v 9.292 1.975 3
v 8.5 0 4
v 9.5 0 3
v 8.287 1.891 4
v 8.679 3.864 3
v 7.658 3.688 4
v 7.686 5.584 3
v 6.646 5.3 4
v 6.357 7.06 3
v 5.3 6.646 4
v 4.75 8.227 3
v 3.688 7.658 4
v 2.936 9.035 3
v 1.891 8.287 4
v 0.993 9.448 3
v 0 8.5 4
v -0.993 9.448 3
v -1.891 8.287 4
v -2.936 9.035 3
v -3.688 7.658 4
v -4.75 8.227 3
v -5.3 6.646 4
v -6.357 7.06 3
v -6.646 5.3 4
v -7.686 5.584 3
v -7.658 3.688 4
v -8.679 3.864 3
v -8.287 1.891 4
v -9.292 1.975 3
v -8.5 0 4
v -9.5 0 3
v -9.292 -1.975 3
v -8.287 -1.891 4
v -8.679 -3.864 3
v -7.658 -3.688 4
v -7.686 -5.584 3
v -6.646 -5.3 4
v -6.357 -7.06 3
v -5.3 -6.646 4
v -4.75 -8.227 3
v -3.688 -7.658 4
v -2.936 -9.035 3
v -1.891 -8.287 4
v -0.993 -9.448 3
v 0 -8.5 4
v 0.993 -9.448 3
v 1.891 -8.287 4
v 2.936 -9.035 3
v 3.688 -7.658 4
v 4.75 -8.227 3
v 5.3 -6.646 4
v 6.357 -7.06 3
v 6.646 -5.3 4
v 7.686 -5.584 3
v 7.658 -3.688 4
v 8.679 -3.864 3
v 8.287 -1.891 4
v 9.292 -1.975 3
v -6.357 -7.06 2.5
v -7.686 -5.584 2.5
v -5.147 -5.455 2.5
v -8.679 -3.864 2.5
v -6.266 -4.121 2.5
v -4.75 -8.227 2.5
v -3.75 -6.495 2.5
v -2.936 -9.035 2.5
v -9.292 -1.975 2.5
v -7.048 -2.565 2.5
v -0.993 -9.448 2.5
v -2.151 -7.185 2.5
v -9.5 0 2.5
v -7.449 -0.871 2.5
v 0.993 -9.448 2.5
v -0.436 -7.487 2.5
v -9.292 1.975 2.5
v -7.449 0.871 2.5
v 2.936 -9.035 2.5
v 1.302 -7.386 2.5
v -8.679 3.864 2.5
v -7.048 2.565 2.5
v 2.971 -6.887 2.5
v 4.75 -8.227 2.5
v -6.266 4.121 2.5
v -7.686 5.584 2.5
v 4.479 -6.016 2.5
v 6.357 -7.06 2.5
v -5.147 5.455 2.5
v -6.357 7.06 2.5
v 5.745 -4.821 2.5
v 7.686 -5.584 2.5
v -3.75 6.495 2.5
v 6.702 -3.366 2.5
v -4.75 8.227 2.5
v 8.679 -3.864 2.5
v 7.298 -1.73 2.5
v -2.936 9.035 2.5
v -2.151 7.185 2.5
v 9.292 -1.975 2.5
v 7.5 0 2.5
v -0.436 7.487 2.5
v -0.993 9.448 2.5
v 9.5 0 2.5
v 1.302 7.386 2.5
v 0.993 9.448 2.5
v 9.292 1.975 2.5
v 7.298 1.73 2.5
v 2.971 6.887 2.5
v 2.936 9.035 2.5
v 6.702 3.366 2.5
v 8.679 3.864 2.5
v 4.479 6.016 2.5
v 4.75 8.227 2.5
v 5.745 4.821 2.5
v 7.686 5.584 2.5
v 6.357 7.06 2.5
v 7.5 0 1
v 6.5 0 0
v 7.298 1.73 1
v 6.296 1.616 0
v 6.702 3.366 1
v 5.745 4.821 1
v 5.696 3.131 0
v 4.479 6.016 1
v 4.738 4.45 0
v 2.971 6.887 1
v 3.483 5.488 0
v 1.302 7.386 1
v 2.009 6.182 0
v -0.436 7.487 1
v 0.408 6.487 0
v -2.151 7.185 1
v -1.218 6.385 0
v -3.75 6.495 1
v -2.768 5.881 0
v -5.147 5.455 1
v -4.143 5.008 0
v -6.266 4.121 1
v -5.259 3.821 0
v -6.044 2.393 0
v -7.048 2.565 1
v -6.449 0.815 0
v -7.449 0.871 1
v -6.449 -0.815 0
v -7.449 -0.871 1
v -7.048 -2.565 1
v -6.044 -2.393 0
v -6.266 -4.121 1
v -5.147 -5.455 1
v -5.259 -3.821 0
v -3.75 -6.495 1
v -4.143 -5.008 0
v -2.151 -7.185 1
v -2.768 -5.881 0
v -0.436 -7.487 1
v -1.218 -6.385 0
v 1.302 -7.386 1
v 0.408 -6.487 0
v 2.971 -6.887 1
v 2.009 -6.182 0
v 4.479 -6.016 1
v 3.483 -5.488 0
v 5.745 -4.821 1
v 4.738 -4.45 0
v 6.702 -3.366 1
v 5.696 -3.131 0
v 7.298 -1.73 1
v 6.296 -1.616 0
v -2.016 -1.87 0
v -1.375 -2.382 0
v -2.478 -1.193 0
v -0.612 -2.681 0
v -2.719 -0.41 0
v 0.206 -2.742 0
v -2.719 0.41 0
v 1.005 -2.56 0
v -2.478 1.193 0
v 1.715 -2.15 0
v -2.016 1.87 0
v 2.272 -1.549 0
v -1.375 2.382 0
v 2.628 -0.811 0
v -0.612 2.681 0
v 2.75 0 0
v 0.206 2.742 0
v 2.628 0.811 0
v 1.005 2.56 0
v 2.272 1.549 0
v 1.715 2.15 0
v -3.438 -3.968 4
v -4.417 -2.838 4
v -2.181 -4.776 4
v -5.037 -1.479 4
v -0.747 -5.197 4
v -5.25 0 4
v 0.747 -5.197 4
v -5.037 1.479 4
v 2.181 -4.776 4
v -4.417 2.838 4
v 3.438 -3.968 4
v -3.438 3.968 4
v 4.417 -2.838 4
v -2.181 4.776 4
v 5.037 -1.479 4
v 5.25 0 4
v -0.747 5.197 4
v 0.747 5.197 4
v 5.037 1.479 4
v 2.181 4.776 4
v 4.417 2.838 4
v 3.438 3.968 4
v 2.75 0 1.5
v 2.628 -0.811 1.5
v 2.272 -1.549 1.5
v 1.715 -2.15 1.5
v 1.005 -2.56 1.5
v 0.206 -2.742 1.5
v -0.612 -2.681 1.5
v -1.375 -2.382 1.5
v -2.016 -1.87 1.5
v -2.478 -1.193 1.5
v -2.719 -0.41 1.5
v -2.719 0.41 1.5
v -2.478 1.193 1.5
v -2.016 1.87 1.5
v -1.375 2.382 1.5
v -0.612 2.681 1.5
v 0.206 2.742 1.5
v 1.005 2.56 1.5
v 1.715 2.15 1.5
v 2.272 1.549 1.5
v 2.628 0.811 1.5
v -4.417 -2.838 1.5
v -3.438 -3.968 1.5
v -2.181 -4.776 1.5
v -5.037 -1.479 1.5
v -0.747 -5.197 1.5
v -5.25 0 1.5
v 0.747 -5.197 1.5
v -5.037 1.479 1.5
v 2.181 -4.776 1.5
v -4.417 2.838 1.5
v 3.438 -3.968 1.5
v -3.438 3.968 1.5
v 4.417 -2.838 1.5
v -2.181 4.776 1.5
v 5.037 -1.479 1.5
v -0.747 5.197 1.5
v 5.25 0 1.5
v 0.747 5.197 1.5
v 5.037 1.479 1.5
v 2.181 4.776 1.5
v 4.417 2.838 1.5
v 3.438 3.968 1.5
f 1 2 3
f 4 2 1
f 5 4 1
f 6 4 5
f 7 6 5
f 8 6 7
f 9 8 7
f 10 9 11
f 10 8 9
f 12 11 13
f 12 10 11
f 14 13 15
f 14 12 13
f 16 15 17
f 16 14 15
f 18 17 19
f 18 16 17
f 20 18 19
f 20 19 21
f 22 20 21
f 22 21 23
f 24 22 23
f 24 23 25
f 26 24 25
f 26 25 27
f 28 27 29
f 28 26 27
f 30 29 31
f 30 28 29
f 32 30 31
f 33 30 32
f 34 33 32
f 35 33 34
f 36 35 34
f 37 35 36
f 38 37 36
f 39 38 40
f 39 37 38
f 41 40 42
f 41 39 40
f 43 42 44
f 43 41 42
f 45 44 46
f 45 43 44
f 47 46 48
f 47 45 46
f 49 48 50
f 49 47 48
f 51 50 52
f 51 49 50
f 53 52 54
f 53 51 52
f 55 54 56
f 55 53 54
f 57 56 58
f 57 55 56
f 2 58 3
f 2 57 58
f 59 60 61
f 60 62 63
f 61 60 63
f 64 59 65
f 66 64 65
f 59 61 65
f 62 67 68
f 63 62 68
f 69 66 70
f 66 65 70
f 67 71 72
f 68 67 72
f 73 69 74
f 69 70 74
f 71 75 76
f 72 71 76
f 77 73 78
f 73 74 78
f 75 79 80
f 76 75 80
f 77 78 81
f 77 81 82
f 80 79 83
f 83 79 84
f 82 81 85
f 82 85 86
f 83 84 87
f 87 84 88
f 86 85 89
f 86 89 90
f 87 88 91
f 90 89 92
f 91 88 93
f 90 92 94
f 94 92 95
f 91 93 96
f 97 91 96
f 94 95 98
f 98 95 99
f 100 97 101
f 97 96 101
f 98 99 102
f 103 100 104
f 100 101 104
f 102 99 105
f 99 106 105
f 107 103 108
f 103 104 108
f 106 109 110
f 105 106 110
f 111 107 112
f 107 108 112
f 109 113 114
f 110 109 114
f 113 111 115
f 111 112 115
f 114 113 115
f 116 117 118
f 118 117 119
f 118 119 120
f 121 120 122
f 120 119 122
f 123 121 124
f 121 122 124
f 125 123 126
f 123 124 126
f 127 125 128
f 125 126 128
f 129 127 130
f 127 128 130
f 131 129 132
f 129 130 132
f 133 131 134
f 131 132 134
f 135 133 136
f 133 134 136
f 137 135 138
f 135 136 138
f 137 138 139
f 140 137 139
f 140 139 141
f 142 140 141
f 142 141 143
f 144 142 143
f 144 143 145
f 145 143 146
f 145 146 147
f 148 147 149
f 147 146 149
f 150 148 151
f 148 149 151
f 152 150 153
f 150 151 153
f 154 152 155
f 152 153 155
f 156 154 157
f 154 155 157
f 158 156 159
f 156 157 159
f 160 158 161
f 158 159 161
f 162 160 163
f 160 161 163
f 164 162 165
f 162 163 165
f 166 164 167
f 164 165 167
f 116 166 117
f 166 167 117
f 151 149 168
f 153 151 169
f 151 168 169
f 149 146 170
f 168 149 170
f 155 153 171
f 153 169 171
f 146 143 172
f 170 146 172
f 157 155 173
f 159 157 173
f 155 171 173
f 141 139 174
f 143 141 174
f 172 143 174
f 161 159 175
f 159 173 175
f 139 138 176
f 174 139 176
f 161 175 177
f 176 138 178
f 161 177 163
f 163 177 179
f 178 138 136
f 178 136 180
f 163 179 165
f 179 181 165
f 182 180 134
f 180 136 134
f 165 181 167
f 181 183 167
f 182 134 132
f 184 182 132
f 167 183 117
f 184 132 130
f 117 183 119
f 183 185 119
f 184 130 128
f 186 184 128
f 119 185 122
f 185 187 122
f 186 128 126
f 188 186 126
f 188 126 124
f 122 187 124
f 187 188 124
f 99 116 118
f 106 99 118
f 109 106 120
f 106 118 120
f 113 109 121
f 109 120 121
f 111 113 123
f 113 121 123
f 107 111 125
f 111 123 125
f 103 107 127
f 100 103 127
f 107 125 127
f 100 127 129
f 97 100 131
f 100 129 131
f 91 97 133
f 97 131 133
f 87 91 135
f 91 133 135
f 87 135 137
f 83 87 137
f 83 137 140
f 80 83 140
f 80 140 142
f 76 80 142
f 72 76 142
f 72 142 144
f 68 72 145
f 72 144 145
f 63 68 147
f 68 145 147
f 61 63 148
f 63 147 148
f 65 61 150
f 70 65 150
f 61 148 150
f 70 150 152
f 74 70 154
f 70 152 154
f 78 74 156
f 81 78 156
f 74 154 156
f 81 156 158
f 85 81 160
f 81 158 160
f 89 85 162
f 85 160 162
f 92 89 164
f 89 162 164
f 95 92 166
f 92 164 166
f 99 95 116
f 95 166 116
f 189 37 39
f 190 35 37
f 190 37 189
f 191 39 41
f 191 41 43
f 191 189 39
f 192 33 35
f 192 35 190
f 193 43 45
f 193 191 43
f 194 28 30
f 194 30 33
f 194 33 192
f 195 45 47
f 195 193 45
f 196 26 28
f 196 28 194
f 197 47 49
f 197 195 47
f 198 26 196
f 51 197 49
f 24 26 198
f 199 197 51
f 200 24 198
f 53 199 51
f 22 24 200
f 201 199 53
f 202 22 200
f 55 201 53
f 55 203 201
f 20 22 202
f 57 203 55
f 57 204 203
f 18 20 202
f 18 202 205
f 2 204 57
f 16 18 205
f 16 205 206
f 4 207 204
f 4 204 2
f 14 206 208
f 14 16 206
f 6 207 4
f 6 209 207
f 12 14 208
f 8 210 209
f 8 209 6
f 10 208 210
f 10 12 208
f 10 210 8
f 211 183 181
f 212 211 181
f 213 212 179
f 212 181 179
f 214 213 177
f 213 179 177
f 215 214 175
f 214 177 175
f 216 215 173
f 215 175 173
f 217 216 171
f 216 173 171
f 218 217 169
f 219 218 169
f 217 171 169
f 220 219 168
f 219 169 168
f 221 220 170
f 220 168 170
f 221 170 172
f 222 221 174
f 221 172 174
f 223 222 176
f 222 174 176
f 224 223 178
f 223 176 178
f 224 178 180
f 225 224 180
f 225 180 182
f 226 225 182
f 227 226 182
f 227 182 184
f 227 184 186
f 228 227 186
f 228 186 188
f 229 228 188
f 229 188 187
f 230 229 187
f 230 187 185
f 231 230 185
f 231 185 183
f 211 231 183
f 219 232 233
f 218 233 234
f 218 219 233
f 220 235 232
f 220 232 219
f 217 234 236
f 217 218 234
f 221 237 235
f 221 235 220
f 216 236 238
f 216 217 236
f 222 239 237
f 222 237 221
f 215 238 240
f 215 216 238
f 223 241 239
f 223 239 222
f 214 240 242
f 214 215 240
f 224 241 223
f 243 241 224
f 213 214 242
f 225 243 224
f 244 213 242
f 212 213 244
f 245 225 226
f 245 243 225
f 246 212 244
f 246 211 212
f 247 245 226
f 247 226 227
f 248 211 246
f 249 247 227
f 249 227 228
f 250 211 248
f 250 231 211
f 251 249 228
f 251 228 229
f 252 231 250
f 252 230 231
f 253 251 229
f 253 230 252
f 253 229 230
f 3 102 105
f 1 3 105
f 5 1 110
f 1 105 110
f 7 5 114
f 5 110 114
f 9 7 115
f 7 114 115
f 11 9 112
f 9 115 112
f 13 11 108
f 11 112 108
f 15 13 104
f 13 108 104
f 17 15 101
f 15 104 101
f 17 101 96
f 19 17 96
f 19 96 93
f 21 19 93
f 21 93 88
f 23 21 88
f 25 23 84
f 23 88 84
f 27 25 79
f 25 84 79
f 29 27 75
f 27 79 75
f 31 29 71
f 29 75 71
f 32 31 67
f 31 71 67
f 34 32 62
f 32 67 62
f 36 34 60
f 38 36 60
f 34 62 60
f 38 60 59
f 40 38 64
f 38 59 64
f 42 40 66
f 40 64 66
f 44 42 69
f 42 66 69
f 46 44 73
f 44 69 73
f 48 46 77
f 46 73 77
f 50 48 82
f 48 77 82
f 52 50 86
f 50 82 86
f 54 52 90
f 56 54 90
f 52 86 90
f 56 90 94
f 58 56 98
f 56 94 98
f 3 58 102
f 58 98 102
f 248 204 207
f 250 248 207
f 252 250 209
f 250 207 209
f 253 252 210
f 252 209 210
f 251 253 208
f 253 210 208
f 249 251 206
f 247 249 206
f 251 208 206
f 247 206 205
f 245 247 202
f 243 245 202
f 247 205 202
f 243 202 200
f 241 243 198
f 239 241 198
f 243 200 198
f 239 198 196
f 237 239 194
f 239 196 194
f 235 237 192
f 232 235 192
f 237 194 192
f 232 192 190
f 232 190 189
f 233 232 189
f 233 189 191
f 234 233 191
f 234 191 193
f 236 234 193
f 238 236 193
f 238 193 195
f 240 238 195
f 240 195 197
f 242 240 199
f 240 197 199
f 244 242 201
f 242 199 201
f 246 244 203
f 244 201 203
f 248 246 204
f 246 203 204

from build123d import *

# Parameters (mm, degrees)
SKETCH_R        = 7.5
PAD_DEPTH       = 2.5
SKETCH001_R     = 9.5
PAD001_DEPTH    = 1.5
SKETCH002_R     = 5.25
POCKET_DEPTH    = 2.5
SKETCH003_R     = 2.75
POCKET001_DEPTH = 5
CHAMFER_SIZE    = 1
CHAMFER001_SIZE = 1


with BuildPart() as part:
    # Sketch → Pad (new body)
    with BuildSketch(Plane.XY):
        Circle(SKETCH_R)
    extrude(amount=PAD_DEPTH)

    # Sketch001 (on Face3 of Pad) → Pad001 (join)
    with BuildSketch(Plane.XY.offset(2.5)):
        Circle(SKETCH001_R)
    extrude(amount=PAD001_DEPTH)

    # Sketch002 (on Face5 of Pad001) → Pocket (cut)
    with BuildSketch(Plane.XY.offset(4)):
        Circle(SKETCH002_R)
    extrude(amount=-POCKET_DEPTH, mode=Mode.SUBTRACT)

    # Sketch003 (on Face2 of Pocket) → Pocket001 (cut)
    with BuildSketch(Plane(origin=(0, 0, 0), x_dir=(1, 0, 0), z_dir=(0, 0, -1))):
        Circle(SKETCH003_R)
    extrude(amount=-POCKET001_DEPTH, mode=Mode.SUBTRACT)

    # Chamfer
    chamfer_edges = [part.edges().sort_by_distance(p)[0] for p in [
        (-9.5, 0, 4),
    ]]
    chamfer(chamfer_edges, length=CHAMFER_SIZE)

    # Chamfer001
    chamfer001_edges = [part.edges().sort_by_distance(p)[0] for p in [
        (-7.5, 0, 0),
    ]]
    chamfer(chamfer001_edges, length=CHAMFER001_SIZE)


solid = part.part
